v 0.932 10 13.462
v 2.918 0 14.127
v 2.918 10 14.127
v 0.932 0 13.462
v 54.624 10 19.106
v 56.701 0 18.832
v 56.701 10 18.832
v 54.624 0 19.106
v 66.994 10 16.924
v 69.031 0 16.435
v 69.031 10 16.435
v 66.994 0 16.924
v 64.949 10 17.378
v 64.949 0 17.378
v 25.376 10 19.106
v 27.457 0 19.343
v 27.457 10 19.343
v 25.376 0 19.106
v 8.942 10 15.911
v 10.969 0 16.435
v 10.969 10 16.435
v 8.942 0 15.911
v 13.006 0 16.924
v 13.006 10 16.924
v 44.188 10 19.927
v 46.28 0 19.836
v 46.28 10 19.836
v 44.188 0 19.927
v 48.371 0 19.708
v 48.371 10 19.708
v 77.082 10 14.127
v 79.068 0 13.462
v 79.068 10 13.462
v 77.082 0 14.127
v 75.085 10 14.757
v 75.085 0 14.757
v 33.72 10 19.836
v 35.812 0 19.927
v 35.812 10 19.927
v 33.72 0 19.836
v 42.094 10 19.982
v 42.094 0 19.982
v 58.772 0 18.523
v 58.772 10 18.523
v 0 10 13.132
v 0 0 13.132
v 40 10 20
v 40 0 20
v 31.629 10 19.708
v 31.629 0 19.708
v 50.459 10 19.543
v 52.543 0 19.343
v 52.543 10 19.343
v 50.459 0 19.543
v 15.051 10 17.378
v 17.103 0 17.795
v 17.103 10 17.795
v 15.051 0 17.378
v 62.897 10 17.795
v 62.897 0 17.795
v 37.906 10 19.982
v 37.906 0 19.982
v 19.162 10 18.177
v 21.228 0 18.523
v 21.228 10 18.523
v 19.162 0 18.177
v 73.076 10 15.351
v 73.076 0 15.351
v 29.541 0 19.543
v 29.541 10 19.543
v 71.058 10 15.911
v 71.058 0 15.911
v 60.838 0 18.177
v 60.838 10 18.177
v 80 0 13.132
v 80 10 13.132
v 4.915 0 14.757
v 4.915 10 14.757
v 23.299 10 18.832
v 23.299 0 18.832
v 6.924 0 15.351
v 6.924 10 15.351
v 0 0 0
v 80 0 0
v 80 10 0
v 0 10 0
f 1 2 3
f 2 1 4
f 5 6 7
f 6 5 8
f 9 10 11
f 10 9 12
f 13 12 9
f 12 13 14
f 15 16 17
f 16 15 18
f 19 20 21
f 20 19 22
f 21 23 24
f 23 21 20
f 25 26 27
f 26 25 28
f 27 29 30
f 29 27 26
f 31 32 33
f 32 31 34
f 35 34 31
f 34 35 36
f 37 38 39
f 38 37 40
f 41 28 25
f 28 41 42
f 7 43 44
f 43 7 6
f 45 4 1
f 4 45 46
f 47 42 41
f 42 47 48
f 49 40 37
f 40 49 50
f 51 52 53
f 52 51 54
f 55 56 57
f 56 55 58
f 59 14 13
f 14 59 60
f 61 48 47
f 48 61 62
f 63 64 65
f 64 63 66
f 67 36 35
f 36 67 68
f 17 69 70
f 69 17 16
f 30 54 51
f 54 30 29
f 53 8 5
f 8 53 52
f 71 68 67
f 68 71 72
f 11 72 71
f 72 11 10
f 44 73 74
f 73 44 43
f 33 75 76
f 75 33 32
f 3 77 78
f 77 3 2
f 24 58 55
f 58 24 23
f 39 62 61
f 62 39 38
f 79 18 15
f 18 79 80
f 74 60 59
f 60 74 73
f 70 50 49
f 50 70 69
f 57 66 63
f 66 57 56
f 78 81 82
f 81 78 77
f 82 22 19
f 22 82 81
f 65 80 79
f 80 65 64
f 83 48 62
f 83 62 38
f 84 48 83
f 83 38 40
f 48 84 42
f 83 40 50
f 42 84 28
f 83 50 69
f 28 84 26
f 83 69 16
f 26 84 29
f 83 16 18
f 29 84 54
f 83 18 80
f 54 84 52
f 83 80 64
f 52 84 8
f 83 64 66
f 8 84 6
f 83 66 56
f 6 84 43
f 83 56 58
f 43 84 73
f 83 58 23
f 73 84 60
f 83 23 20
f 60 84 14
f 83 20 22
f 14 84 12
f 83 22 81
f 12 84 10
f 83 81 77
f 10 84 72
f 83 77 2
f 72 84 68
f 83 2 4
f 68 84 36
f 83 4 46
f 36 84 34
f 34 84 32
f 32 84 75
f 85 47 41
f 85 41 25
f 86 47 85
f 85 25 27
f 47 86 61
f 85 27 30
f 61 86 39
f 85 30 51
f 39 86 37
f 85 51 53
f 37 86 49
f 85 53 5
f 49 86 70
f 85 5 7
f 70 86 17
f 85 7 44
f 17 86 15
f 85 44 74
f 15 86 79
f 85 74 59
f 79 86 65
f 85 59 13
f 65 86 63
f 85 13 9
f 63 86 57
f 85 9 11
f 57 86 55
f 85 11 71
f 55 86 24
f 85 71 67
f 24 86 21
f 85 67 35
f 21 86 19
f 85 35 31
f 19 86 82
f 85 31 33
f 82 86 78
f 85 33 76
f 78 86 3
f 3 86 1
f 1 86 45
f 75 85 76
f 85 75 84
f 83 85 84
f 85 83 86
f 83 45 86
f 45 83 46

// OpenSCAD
$fs = 0.2;
$fa = 1;

intersection() {
	translate([40, 0, -100]) {
		rotate([-90, 0, 0]) {
			cylinder(r=120, h=10);
		}
	}
	cube([80, 10, 1000]);
}
